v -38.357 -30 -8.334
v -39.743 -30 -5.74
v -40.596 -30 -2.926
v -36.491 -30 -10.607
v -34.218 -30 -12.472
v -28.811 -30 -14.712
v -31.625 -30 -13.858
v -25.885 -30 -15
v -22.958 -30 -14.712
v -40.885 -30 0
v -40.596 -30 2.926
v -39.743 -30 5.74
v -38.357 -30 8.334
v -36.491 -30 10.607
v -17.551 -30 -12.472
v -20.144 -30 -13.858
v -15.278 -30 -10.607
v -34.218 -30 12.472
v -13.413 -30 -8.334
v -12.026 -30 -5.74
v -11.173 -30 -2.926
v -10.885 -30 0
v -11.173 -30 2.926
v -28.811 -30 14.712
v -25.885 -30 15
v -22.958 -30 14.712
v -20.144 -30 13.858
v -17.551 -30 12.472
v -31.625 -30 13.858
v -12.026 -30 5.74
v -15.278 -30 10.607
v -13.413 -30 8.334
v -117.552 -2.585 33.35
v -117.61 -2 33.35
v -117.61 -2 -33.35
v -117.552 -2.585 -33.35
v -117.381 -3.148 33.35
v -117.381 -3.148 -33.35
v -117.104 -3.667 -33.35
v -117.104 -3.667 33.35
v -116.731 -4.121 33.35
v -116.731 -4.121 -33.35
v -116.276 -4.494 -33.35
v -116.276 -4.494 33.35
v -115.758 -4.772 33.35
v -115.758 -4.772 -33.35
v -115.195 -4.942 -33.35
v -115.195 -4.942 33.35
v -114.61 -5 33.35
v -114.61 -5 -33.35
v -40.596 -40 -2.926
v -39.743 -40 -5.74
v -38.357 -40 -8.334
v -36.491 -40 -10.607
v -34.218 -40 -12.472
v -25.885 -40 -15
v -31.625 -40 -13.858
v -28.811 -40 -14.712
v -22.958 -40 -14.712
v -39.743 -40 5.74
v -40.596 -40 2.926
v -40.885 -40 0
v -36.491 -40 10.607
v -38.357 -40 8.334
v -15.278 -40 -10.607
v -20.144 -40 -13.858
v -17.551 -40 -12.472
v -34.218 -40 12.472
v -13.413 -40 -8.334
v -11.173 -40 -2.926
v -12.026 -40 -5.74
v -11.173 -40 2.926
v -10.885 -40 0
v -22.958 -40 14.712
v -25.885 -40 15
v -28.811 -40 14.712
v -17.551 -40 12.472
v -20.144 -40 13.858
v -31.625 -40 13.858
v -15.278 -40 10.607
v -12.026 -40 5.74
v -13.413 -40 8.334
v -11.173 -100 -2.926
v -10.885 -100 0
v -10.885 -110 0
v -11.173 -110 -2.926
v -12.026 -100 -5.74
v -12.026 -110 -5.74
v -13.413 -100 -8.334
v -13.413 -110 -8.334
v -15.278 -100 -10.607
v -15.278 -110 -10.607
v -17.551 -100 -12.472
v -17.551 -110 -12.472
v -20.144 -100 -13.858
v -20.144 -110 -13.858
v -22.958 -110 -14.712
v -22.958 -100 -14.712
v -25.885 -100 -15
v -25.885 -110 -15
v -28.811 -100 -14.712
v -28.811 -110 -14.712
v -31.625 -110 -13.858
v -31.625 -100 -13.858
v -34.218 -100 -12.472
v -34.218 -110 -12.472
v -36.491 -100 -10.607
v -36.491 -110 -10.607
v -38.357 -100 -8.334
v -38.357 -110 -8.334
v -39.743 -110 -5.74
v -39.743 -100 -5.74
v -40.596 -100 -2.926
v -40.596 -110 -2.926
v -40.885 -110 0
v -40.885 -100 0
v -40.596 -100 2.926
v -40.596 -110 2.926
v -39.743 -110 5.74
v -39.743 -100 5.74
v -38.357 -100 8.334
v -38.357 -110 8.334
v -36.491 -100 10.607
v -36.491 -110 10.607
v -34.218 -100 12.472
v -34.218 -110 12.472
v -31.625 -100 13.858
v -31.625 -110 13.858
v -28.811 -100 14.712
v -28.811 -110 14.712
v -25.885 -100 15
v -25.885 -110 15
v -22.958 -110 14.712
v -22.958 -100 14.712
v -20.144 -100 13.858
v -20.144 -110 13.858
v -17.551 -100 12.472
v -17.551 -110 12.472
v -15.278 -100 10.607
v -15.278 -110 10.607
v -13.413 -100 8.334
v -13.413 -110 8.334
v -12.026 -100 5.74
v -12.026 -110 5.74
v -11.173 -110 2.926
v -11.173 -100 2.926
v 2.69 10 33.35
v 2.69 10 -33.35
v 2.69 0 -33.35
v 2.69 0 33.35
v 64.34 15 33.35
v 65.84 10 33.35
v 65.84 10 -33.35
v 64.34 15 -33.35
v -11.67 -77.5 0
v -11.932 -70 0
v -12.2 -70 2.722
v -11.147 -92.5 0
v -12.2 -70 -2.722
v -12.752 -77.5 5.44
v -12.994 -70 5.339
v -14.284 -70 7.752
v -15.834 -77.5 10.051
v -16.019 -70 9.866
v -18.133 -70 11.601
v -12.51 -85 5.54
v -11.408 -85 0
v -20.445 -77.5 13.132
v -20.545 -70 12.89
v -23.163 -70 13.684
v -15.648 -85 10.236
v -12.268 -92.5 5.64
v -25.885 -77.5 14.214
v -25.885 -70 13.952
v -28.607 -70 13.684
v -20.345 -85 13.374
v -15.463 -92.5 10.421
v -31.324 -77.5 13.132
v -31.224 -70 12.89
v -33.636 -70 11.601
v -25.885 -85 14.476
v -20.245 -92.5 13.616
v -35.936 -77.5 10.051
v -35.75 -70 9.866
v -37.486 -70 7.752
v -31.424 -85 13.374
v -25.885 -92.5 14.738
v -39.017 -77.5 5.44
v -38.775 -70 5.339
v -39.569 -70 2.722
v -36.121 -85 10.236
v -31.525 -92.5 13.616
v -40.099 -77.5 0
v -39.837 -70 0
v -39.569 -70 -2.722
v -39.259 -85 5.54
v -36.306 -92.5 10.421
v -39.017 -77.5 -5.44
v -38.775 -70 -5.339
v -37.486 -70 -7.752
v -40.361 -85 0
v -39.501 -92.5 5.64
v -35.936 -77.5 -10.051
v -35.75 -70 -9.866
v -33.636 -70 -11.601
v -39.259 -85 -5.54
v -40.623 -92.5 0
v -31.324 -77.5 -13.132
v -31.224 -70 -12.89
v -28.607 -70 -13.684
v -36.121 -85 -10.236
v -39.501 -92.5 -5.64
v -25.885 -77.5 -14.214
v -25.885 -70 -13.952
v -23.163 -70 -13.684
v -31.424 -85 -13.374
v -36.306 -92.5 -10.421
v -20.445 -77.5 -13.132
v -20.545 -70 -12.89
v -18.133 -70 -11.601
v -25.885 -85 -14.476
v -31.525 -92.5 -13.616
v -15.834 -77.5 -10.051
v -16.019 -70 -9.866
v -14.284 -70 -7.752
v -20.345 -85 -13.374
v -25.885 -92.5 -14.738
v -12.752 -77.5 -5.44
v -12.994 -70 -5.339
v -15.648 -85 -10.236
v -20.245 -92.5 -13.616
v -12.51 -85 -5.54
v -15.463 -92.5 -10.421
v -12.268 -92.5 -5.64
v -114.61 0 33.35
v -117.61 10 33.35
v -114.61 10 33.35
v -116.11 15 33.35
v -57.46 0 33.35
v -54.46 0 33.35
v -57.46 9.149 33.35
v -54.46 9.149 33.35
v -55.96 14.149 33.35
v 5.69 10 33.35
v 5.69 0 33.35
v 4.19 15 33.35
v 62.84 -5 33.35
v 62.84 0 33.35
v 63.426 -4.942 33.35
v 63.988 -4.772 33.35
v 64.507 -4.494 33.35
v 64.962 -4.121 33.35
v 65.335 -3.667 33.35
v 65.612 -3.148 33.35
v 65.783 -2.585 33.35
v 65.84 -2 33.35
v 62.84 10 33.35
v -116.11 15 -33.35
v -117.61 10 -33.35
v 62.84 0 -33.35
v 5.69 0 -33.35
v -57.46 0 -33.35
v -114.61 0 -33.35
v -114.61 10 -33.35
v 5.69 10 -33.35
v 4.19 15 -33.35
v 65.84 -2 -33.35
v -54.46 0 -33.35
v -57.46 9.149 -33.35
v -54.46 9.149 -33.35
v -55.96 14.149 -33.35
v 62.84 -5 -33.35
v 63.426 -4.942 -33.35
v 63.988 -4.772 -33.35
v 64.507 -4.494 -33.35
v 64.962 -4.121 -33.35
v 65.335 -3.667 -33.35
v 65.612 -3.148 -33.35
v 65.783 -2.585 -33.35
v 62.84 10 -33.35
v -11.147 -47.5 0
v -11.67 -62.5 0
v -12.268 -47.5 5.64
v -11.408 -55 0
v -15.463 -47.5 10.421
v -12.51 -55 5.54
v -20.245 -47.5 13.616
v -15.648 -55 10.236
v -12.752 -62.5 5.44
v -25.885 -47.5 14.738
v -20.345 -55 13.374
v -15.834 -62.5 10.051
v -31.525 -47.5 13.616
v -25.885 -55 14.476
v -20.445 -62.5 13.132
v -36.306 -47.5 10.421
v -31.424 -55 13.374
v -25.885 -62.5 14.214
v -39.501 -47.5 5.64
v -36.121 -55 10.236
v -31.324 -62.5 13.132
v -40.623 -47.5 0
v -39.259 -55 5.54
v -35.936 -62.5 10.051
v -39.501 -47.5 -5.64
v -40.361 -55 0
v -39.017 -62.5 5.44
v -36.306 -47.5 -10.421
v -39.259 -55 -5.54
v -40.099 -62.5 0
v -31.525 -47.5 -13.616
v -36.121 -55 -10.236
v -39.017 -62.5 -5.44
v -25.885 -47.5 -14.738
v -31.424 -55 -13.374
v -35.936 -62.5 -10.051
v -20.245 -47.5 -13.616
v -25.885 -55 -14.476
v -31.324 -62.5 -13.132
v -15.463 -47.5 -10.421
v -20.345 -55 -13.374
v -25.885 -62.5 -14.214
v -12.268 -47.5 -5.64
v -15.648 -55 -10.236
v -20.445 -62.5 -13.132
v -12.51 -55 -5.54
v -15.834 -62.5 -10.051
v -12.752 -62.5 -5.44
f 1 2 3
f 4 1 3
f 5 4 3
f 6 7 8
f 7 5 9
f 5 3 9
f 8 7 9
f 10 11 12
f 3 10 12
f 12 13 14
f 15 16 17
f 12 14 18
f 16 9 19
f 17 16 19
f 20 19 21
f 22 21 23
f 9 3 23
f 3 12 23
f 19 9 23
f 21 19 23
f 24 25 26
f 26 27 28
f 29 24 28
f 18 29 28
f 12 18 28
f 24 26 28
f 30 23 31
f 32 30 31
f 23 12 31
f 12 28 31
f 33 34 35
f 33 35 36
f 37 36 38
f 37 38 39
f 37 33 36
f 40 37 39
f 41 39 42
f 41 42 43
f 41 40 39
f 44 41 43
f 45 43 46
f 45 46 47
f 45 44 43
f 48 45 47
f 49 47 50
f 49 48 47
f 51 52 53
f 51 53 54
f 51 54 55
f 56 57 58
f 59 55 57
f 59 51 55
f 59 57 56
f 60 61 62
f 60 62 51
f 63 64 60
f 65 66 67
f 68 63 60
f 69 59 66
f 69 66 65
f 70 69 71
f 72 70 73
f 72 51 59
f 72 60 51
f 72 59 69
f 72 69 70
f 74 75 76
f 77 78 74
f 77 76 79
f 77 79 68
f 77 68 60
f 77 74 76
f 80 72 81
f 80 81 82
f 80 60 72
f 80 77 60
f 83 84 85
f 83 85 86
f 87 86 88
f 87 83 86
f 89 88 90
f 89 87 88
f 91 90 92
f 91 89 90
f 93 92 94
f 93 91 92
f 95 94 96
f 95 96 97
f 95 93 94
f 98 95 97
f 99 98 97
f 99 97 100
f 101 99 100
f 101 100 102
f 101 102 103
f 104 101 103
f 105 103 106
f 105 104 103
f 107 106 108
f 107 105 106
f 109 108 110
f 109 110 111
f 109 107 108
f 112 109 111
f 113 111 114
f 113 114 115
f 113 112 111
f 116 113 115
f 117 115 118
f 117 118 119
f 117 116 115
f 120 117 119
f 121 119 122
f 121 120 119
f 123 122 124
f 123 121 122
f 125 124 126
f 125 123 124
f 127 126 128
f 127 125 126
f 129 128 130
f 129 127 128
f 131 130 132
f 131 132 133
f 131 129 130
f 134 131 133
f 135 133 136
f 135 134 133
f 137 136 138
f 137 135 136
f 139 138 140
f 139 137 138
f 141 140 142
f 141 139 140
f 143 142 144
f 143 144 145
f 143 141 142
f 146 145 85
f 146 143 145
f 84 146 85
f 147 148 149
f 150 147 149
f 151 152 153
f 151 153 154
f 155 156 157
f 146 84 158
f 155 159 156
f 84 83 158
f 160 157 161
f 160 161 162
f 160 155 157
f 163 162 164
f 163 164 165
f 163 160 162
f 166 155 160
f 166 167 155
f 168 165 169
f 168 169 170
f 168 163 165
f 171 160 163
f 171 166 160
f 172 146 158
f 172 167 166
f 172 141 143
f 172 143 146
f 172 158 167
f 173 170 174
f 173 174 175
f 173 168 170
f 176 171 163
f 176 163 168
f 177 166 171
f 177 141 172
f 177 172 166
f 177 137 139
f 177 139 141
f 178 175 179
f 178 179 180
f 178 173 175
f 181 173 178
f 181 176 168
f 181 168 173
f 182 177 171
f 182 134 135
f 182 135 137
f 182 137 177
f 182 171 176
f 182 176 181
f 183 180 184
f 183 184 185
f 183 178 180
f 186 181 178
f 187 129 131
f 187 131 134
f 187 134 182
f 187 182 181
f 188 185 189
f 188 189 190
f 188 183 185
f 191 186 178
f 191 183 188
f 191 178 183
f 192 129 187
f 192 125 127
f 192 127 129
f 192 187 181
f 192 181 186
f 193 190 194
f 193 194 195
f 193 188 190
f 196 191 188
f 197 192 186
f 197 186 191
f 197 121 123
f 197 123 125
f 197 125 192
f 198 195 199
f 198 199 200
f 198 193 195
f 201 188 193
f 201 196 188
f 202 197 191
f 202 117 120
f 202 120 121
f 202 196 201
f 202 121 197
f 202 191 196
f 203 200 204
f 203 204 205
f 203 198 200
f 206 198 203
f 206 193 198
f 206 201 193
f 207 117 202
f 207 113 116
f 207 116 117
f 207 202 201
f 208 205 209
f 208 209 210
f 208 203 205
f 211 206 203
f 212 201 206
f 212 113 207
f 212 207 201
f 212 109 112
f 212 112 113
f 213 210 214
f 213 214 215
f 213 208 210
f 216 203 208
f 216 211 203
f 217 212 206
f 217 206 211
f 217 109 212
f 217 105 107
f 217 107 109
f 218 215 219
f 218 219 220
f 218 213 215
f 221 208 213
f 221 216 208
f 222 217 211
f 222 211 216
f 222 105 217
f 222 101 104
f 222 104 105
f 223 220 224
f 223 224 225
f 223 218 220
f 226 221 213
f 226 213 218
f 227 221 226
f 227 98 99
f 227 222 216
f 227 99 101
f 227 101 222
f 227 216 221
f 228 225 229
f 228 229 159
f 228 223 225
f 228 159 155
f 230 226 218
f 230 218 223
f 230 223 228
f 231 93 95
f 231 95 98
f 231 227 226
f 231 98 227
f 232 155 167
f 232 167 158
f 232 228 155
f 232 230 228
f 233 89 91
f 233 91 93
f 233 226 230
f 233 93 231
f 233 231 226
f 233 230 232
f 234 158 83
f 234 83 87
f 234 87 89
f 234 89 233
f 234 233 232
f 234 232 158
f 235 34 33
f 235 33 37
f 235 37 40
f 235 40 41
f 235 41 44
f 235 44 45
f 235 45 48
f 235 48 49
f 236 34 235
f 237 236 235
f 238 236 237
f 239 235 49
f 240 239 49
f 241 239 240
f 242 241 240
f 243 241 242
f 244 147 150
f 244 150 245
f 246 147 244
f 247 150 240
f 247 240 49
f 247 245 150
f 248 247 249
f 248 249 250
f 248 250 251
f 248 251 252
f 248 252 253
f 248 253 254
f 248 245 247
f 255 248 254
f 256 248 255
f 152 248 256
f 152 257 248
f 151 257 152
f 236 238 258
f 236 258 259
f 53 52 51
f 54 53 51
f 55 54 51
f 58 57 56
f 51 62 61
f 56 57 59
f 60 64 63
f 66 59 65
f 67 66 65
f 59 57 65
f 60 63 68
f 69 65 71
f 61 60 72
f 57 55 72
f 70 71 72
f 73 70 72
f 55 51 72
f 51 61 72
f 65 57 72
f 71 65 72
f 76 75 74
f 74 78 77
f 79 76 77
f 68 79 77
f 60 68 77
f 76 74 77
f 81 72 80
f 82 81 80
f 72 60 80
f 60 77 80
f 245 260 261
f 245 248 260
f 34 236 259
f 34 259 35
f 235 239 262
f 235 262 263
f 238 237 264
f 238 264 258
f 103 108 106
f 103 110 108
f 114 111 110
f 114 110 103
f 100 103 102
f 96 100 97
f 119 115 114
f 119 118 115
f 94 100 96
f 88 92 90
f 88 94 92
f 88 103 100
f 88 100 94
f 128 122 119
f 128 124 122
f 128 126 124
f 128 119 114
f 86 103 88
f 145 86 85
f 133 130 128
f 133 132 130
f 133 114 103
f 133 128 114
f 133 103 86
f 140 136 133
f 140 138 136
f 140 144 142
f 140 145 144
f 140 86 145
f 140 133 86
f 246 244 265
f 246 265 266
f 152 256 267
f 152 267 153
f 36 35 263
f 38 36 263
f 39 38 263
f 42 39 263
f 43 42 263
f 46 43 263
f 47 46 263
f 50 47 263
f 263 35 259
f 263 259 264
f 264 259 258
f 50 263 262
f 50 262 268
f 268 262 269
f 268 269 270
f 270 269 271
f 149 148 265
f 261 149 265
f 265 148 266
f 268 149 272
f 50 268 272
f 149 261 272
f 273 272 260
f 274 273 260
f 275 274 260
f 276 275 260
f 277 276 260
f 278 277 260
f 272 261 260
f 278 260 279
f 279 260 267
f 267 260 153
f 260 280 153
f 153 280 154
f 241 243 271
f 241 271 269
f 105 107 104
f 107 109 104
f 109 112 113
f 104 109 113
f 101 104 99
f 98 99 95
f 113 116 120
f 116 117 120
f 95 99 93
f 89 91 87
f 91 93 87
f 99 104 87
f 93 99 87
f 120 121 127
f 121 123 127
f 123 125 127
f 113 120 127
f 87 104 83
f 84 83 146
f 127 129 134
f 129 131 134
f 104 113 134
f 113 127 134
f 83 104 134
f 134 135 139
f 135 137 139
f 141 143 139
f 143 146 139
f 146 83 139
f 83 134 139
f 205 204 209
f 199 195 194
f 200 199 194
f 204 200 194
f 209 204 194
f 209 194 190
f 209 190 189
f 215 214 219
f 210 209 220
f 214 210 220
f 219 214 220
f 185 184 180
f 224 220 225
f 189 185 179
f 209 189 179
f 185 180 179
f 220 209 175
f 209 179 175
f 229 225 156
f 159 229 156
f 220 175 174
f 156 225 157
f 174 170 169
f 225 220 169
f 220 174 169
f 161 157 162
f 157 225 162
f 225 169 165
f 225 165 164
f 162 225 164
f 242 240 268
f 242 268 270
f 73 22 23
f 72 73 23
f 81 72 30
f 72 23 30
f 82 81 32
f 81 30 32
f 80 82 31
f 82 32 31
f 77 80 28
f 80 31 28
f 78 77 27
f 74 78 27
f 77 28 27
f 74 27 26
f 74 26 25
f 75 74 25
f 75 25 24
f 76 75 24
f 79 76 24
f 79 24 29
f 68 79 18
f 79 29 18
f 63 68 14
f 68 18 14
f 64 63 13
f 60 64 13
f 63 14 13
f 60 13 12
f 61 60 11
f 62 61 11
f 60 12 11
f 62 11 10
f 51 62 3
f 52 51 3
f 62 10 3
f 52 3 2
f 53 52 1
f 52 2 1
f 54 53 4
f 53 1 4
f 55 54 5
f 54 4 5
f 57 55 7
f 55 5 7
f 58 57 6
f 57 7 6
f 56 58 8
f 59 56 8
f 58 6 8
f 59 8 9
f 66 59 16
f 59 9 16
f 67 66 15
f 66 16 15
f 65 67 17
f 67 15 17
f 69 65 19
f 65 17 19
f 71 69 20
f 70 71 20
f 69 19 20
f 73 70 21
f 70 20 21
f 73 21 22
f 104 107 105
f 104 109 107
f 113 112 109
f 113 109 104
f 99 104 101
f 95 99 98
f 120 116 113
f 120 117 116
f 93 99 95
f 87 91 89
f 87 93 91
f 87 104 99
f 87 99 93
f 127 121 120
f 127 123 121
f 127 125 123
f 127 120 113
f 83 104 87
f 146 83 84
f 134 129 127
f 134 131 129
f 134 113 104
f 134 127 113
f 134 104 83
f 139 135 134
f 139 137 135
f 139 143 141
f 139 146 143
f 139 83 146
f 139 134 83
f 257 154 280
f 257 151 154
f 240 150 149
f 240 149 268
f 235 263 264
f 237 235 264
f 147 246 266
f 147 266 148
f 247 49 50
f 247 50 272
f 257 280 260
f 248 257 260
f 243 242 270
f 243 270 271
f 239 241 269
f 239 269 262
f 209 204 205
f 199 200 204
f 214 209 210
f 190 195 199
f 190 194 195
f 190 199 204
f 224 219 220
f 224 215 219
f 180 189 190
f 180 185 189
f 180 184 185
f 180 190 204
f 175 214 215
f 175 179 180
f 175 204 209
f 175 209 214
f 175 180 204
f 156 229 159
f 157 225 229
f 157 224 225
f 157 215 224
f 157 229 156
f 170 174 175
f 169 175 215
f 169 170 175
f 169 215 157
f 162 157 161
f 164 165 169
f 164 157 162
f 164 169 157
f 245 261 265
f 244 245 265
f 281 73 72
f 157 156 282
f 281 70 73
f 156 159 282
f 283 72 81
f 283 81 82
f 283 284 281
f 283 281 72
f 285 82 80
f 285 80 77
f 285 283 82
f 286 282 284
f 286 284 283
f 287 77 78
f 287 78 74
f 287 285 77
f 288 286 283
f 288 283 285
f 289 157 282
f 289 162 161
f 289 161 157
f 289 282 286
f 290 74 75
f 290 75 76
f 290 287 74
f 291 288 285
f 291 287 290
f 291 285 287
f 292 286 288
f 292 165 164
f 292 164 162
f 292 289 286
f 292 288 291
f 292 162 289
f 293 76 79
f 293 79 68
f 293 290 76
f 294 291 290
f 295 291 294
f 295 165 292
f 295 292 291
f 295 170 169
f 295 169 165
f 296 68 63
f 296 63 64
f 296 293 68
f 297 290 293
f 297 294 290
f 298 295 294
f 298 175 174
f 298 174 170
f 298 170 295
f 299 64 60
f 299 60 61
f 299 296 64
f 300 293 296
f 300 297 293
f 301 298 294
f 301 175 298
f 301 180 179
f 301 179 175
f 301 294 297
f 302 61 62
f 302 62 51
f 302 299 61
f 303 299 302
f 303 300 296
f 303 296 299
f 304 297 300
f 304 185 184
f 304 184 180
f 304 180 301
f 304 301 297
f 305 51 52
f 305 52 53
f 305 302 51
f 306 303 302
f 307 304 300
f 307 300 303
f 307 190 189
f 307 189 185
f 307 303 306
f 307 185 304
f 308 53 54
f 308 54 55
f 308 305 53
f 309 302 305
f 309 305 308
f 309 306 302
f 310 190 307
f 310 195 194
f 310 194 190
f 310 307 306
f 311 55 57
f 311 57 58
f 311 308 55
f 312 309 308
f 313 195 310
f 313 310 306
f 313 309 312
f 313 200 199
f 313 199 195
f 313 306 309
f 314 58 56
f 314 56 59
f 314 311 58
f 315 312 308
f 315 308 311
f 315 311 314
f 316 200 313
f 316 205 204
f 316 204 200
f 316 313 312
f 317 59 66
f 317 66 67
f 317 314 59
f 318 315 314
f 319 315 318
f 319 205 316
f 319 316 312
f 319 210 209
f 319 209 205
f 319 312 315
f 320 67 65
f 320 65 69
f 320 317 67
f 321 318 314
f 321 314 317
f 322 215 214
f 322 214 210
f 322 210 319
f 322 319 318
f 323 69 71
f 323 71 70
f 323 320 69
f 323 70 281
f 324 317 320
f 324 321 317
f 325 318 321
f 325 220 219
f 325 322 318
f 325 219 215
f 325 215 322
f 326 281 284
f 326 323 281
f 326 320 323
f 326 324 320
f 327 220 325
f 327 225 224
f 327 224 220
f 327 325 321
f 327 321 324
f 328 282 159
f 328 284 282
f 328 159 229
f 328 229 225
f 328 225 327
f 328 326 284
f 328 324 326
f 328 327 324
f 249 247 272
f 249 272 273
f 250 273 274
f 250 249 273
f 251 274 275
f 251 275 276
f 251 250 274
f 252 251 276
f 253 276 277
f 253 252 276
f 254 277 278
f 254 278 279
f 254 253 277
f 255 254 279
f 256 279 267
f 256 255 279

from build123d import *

# Parameters (mm, degrees)
F1_DEPTH  = 33.35
F3_R      = 15
F4_DEPTH  = 10
F4_FACE_R = 15
F5_DEPTH  = 30
F5_TAPER  = 2
F5_FACE_R = 13.9523769152
F6_DEPTH  = 30
F6_TAPER  = -2
F7_DEPTH  = 10


with BuildPart() as f1:
    # F0 (on Top) → F1 (new body, symmetric)
    with BuildSketch(Plane.XY):
        with BuildLine():
            Line((65.8403338313, 0), (62.8403338313, 0))
            Line((62.8403338313, 0), (5.6903338313, 0))
            Line((5.6903338313, 0), (5.6903338313, 10))
            Line((5.6903338313, 10), (4.1903338313, 10))
            Line((4.1903338313, 10), (2.6903338313, 10))
            Line((2.6903338313, 10), (2.6903338313, 0))
            Line((2.6903338313, 0), (-54.4596661687, 0))
            Line((-54.4596661687, 0), (-54.4596661687, 9.1486750171))
            Line((-54.4596661687, 9.1486750171), (-55.9596661687, 9.1486750171))
            Line((-55.9596661687, 9.1486750171), (-57.4596661687, 9.1486750171))
            Line((-57.4596661687, 9.1486750171), (-57.4596661687, 0))
            Line((-57.4596661687, 0), (-114.6096661687, 0))
            Line((-114.6096661687, 0), (-117.6096661687, 0))
            Line((-117.6096661687, 0), (-117.6096661687, -2))
            ThreePointArc((-117.6096661687, -2), (-116.730986545, -4.1213202645), (-114.6096662804, -4.9999998882))
            Line((-114.6096662804, -4.9999998882), (-57.4596661687, -4.9999998882))
            Line((-57.4596661687, -4.9999998882), (-54.4596661687, -4.9999998882))
            Line((-54.4596661687, -4.9999998882), (2.6903338313, -4.9999998882))
            Line((2.6903338313, -4.9999998882), (5.6903338313, -4.9999998882))
            Line((5.6903338313, -4.9999998882), (62.8403338313, -4.9999998882))
            ThreePointArc((62.8403338313, -4.9999998882), (64.9616541681, -4.121320304), (65.8403338313, -2))
            Line((65.8403338313, -2), (65.8403338313, 0))
        make_face()
        Polygon((62.8403338313, 10), (62.8403338313, 0), (65.8403338313, 0), (65.8403338313, 10), (64.3403338313, 10), align=None)
        Polygon((64.3403338313, 15), (62.8403338313, 10), (64.3403338313, 10), align=None)
        Polygon((64.3403338313, 15), (64.3403338313, 10), (65.8403338313, 10), align=None)
        Polygon((4.1903338313, 10), (5.6903338313, 10), (4.1903338313, 15), align=None)
        Polygon((2.6903338313, 10), (4.1903338313, 10), (4.1903338313, 15), align=None)
        Polygon((-55.9596661687, 9.1486750171), (-54.4596661687, 9.1486750171), (-55.9596661687, 14.1486750171), align=None)
        Polygon((-57.4596661687, 9.1486750171), (-55.9596661687, 9.1486750171), (-55.9596661687, 14.1486750171), align=None)
        Polygon((-117.6096661687, 10), (-117.6096661687, 0), (-114.6096661687, 0), (-114.6096661687, 10), (-116.1096661687, 10), align=None)
        Polygon((-116.1096661687, 15), (-117.6096661687, 10), (-116.1096661687, 10), align=None)
        Polygon((-116.1096661687, 10), (-114.6096661687, 10), (-116.1096661687, 15), align=None)
    extrude(amount=F1_DEPTH, both=True)


with BuildPart() as f4:
    # F3 (on offset) → F4 (new body)
    with BuildSketch(Plane.XZ.offset(29.9999998882)):
        with Locations((-25.8846662246, 0)):
            Circle(F3_R)
    extrude(amount=F4_DEPTH)


with BuildPart() as f5:
    # F4_face (on face) → F5 (new body)
    with BuildSketch(Plane(origin=(-25.8846662246, -39.9999998882, 0), x_dir=(1, 0, 0), z_dir=(0, -1, 0))):
        Circle(F4_FACE_R)
    extrude(amount=F5_DEPTH, taper=F5_TAPER)


with BuildPart() as f6:
    # F5_face (on face) → F6 (new body)
    with BuildSketch(Plane(origin=(-25.8846662246, -69.9999998882, 0), x_dir=(1, 0, 0), z_dir=(0, -1, 0))):
        Circle(F5_FACE_R)
    extrude(amount=F6_DEPTH, taper=F6_TAPER)


with BuildPart() as f7:
    # F7 (new): a face of the model
    f7_faces = [f6.part.faces().sort_by_distance(p)[0] for p in [
        (-25.8846662246, -99.9999998882, 0),
    ]]
    extrude(f7_faces, amount=F7_DEPTH)


solid = Compound([f1.part, f4.part, f5.part, f6.part, f7.part])
